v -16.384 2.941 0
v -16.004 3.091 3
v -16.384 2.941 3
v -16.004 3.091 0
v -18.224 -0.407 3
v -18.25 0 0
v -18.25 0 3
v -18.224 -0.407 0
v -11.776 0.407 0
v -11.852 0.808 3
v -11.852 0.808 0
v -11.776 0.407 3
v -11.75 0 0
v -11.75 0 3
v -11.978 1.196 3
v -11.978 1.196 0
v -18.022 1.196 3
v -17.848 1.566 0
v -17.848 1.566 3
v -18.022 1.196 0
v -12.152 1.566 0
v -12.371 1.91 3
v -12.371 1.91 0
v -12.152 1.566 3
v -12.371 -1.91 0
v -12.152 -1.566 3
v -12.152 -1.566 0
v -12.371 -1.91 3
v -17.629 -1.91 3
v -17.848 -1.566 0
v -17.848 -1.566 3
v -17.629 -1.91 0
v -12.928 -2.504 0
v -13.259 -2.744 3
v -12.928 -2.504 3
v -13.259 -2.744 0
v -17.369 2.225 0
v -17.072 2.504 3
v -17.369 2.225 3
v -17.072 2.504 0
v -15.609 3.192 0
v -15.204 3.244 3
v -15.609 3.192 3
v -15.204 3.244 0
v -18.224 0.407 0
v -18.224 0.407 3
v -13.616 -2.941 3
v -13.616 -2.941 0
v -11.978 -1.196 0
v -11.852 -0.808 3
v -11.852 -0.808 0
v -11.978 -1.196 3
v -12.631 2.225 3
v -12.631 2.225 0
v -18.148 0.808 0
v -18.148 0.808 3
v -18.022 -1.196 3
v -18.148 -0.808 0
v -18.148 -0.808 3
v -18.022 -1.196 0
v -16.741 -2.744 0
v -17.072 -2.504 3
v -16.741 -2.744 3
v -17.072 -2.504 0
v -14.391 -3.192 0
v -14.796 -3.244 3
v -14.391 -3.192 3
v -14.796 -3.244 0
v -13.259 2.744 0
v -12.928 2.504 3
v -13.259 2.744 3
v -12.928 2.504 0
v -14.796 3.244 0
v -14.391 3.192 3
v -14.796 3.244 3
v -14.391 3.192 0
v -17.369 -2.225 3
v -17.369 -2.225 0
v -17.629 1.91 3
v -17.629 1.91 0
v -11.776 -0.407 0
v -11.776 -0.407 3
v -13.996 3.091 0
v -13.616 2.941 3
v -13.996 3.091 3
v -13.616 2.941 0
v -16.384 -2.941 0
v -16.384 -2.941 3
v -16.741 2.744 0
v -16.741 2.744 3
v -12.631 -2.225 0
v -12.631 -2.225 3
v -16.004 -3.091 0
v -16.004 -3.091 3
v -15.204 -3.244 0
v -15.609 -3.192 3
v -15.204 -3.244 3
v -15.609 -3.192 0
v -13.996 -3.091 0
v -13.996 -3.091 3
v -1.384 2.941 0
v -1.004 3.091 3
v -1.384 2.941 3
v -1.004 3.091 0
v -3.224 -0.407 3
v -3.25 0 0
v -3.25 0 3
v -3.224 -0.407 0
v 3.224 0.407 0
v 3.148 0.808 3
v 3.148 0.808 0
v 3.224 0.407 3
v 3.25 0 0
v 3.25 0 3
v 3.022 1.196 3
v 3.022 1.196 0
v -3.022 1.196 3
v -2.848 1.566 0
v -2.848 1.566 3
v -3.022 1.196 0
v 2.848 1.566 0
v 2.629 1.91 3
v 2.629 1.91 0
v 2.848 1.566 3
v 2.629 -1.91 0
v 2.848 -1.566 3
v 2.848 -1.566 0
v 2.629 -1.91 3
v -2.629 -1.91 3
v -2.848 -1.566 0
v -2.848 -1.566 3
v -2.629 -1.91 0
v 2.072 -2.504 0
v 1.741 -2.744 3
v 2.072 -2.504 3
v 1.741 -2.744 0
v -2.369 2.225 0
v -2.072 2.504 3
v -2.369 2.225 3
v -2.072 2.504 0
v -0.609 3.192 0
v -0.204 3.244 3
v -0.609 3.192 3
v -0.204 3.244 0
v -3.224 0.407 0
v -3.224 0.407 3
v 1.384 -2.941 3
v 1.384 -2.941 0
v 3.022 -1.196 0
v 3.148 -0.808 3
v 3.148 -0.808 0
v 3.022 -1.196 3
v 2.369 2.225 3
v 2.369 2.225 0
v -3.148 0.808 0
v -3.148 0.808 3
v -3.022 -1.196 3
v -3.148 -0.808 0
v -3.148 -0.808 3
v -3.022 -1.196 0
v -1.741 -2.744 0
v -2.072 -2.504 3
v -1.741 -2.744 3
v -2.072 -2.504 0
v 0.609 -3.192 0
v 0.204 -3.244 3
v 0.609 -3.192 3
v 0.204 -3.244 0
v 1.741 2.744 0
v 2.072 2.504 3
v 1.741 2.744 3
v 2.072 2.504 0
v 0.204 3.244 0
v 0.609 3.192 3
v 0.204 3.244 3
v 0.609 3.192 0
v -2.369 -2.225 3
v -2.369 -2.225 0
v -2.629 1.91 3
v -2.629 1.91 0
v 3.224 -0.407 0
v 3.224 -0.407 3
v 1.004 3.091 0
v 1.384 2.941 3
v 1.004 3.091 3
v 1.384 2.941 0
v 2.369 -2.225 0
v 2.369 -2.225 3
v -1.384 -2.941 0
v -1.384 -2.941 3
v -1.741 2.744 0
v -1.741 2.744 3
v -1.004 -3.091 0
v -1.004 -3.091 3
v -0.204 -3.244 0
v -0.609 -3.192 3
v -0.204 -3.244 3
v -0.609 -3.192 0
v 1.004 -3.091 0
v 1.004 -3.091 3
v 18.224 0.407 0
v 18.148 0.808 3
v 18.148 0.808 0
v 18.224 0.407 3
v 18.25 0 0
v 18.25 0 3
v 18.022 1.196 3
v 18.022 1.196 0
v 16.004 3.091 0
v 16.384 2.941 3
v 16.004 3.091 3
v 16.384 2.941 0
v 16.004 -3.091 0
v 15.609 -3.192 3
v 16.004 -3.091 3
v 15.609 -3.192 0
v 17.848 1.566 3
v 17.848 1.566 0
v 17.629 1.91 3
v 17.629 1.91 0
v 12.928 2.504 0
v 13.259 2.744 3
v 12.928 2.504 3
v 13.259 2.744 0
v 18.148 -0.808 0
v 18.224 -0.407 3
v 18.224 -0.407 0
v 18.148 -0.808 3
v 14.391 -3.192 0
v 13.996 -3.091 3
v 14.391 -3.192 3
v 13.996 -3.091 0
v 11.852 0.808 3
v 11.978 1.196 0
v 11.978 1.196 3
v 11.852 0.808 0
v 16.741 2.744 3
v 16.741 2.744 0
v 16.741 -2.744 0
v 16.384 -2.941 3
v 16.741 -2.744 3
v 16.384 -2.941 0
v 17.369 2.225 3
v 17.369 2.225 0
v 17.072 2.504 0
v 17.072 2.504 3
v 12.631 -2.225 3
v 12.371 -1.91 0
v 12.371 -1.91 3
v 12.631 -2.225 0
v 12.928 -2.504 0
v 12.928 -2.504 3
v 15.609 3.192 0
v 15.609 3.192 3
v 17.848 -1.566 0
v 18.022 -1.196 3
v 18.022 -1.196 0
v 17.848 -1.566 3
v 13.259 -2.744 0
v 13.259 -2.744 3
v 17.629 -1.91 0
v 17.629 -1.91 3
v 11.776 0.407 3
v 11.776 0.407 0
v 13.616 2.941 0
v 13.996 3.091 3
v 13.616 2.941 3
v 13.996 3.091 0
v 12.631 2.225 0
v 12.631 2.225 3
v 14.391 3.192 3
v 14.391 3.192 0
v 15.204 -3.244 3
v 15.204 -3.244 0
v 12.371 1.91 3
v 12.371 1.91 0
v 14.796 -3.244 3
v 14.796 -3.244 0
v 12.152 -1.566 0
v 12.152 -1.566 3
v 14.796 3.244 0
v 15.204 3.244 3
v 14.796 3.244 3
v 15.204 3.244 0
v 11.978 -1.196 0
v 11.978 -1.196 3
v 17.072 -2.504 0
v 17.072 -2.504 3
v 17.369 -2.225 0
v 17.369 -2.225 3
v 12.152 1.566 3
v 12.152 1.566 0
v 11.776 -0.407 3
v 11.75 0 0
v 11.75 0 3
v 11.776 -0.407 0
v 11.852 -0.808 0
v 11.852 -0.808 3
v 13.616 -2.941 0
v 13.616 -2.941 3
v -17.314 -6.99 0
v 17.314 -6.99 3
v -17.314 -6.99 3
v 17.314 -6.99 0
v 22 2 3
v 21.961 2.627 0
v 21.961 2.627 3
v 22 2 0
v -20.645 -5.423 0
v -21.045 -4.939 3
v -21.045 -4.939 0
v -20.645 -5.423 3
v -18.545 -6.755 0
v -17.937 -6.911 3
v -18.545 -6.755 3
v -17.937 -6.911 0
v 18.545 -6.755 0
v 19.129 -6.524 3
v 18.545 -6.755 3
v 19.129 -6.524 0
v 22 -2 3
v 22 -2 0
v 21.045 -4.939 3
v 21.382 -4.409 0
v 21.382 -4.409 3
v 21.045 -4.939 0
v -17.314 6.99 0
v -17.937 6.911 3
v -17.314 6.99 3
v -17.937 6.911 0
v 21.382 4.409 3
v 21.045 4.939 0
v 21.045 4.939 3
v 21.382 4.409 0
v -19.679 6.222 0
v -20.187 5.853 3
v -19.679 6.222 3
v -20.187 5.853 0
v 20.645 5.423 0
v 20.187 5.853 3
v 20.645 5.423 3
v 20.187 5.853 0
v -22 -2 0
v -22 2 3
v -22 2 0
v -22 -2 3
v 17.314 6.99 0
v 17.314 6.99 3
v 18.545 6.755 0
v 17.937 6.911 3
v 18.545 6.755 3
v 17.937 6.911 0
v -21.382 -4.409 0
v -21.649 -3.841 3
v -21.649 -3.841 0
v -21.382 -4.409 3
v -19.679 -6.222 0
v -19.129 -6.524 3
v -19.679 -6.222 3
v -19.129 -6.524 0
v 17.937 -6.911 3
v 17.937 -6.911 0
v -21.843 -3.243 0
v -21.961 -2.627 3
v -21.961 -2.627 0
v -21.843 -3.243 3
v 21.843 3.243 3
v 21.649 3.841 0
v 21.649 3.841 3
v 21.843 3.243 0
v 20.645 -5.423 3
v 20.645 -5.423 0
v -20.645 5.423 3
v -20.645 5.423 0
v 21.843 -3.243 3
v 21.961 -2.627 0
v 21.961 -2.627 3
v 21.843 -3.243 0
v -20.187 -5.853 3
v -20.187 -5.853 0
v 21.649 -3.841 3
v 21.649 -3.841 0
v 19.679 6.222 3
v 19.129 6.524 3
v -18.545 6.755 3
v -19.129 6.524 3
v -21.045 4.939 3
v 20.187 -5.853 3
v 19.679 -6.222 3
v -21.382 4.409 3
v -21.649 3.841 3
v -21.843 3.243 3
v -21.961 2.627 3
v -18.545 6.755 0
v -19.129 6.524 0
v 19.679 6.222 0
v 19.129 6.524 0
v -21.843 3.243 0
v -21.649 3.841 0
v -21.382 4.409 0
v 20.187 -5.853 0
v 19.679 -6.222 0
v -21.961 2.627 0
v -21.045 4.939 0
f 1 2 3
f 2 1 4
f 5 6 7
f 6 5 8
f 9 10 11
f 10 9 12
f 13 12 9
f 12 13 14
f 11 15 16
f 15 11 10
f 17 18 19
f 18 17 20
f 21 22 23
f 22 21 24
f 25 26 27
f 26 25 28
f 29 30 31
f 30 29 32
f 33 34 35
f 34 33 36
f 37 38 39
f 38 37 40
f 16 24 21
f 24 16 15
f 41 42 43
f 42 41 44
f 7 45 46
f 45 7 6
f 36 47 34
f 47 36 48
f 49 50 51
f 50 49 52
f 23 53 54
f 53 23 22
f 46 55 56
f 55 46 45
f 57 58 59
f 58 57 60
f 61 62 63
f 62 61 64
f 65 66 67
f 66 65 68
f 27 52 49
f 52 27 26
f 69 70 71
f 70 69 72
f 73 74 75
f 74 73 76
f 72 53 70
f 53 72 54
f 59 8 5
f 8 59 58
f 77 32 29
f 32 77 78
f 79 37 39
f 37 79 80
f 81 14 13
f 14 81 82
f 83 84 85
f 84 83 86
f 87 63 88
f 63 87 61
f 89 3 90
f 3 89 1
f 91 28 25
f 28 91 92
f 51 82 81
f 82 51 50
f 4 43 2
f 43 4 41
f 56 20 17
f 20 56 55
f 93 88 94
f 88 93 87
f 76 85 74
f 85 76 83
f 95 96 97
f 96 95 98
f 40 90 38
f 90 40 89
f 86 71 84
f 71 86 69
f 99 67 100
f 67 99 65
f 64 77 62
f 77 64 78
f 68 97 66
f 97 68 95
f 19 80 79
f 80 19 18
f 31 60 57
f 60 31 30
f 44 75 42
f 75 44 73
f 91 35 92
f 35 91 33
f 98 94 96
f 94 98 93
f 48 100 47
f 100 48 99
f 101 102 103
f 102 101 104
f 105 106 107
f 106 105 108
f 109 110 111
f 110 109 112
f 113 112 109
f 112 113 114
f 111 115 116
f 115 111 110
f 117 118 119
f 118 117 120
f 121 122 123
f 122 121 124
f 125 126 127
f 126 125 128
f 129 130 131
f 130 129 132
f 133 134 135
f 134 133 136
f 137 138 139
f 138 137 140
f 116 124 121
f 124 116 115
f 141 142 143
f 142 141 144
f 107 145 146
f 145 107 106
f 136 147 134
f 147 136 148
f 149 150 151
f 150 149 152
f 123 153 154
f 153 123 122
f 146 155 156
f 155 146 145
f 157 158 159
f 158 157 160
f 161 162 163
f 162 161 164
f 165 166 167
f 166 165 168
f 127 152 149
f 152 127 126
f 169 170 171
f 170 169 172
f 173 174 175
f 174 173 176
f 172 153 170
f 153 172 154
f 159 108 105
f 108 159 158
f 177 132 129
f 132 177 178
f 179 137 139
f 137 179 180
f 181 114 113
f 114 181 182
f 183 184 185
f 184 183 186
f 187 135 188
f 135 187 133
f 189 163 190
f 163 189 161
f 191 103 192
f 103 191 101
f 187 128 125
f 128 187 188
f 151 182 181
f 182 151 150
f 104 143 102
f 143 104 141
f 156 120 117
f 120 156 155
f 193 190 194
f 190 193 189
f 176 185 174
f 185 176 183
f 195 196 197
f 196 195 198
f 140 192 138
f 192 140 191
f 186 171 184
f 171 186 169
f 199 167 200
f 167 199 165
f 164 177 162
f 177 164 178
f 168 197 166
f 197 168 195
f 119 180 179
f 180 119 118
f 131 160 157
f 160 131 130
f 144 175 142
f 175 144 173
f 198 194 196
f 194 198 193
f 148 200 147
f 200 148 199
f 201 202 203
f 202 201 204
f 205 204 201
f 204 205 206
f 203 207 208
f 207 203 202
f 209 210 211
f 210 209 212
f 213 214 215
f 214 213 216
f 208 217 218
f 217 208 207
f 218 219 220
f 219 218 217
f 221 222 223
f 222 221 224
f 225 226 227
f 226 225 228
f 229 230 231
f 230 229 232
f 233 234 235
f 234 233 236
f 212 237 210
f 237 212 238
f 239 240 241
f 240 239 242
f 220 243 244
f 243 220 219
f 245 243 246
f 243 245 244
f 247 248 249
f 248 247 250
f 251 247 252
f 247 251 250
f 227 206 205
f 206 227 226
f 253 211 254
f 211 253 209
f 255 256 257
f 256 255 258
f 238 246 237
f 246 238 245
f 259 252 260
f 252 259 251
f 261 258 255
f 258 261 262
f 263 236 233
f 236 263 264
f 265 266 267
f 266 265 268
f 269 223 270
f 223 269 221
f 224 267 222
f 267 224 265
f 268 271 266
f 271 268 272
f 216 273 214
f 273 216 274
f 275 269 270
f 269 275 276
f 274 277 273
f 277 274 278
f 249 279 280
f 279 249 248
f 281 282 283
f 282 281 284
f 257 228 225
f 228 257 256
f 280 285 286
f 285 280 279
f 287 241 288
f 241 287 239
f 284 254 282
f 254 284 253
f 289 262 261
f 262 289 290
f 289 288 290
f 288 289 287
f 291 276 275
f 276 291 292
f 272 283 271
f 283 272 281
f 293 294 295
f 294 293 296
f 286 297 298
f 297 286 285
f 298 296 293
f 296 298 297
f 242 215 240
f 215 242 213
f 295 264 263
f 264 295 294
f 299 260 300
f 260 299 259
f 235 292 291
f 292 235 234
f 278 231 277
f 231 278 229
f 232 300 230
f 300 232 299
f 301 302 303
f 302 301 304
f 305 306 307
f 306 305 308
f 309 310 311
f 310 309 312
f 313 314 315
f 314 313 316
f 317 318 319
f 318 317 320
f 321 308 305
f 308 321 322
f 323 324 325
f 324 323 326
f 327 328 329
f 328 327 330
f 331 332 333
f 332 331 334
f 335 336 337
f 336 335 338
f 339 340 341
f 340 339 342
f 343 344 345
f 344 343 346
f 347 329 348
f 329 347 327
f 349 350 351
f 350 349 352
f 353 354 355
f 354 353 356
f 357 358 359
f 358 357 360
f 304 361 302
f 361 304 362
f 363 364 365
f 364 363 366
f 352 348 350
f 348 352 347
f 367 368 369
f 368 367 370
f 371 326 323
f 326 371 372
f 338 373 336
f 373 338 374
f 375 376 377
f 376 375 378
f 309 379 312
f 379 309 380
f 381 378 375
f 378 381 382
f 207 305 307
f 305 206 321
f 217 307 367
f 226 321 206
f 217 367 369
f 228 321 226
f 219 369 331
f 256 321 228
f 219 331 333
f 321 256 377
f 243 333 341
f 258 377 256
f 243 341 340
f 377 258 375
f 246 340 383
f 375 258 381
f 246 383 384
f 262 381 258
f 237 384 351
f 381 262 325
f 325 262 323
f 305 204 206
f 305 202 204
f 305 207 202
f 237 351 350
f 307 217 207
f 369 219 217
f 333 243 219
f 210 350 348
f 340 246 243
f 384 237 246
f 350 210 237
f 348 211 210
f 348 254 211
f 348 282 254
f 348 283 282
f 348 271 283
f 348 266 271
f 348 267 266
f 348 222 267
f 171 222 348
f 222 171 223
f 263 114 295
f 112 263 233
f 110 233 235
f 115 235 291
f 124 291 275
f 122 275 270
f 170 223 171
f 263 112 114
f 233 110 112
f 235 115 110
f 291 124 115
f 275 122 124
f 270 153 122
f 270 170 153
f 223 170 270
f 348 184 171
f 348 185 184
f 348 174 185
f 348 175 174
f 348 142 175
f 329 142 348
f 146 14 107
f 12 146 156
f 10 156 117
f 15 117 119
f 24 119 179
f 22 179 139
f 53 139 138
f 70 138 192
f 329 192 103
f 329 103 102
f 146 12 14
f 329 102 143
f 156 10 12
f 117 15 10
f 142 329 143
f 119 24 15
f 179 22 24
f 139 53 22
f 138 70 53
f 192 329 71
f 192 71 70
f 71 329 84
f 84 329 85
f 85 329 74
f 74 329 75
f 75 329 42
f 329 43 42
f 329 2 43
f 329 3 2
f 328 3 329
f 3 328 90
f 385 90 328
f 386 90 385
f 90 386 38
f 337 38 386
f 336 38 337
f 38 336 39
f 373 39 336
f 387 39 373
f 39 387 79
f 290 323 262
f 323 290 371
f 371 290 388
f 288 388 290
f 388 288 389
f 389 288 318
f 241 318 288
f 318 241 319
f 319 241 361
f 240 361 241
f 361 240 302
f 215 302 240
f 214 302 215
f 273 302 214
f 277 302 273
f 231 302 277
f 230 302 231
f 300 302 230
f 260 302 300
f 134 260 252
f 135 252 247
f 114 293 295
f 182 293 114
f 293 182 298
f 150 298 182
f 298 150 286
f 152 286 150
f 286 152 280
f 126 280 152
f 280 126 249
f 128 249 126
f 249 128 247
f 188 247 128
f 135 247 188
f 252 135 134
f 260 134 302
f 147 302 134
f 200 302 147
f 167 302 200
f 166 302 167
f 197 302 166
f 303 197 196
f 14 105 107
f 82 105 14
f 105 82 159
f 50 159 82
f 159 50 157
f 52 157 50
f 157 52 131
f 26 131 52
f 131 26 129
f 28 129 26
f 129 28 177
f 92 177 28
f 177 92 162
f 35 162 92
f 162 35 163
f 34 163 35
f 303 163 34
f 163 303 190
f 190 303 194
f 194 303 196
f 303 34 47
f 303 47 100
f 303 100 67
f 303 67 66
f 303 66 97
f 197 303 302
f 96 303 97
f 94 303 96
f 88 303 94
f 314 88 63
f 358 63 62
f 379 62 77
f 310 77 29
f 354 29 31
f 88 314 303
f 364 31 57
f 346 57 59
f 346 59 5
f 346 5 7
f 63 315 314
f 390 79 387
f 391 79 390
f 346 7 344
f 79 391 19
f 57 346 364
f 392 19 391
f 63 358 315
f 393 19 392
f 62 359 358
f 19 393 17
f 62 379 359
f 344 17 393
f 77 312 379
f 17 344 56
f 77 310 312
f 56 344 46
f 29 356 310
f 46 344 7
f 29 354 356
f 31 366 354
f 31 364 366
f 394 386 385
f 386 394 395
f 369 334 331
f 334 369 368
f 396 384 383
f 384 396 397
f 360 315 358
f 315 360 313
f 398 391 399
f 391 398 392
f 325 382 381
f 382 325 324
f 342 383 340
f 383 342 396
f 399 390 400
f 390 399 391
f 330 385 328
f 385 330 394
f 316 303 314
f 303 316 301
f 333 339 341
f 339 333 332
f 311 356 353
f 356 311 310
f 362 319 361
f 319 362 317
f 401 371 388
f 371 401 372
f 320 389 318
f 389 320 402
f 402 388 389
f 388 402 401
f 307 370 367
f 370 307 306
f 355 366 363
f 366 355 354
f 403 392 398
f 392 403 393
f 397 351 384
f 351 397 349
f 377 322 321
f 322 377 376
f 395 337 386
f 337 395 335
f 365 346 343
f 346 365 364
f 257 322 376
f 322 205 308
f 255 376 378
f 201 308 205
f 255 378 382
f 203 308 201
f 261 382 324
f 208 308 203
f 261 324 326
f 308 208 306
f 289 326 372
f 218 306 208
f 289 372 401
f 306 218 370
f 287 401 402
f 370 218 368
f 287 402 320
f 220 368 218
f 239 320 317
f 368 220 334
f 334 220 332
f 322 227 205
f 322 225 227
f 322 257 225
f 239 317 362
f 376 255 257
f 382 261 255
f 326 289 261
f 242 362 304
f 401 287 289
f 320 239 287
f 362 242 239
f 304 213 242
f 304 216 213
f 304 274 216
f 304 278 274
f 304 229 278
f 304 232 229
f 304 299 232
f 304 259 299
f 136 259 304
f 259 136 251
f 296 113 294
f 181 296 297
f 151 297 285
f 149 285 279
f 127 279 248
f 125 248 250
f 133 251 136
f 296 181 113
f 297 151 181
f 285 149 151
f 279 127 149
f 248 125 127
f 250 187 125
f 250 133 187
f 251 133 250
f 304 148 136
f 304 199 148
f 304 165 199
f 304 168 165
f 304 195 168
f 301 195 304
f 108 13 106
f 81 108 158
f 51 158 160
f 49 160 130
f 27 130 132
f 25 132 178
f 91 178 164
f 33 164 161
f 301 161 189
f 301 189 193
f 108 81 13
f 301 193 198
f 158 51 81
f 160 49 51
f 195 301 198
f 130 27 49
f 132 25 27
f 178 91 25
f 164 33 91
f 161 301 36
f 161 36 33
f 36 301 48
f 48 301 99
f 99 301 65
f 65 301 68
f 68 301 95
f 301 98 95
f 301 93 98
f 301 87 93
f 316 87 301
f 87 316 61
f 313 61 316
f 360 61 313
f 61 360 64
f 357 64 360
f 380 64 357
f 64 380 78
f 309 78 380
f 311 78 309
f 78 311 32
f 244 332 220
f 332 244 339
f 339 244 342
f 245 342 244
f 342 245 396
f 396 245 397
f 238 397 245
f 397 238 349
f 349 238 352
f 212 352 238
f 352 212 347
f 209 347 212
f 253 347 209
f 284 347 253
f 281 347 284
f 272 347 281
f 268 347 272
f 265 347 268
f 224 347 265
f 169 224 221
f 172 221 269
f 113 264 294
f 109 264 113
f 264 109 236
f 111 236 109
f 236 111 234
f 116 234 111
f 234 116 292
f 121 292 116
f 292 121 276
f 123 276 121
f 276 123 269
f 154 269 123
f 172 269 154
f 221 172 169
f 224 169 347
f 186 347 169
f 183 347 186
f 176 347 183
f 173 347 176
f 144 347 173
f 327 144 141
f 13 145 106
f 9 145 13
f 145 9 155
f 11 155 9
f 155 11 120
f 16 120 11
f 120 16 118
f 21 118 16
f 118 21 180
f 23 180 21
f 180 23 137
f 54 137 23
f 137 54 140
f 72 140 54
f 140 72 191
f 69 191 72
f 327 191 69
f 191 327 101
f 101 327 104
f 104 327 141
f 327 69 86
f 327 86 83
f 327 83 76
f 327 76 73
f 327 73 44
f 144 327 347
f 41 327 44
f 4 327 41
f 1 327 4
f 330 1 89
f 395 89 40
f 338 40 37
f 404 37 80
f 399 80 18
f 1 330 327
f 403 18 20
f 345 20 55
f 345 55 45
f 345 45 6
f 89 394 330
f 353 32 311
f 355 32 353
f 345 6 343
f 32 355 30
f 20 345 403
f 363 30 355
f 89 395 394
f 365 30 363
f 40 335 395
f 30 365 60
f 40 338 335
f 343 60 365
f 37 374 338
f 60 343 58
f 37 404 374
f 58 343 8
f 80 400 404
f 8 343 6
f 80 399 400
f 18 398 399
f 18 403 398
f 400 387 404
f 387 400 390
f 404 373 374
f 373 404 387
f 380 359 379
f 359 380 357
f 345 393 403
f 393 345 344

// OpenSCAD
// Generated by SolidPython 1.1.3 on 2023-03-12 21:51:37
$fn = 50;


difference() {
	union() {
		translate(v = [0, 0, 0]) {
			rotate(a = [0, 0, 0]) {
				hull() {
					translate(v = [-17.0000000000, 2.0000000000, 0]) {
						rotate(a = [0, 0, 0]) {
							translate(v = [0, 0, 0]) {
								rotate(a = [0, 0, 0]) {
									cylinder(h = 3, r = 5);
								}
							}
						}
					}
					translate(v = [17.0000000000, 2.0000000000, 0]) {
						rotate(a = [0, 0, 0]) {
							translate(v = [0, 0, 0]) {
								rotate(a = [0, 0, 0]) {
									cylinder(h = 3, r = 5);
								}
							}
						}
					}
					translate(v = [-17.0000000000, -2.0000000000, 0]) {
						rotate(a = [0, 0, 0]) {
							translate(v = [0, 0, 0]) {
								rotate(a = [0, 0, 0]) {
									cylinder(h = 3, r = 5);
								}
							}
						}
					}
					translate(v = [17.0000000000, -2.0000000000, 0]) {
						rotate(a = [0, 0, 0]) {
							translate(v = [0, 0, 0]) {
								rotate(a = [0, 0, 0]) {
									cylinder(h = 3, r = 5);
								}
							}
						}
					}
				}
			}
		}
	}
	union() {
		translate(v = [-15.0000000000, 0.0000000000, 0]) {
			rotate(a = [0, 0, 0]) {
				translate(v = [0, 0, -50]) {
					rotate(a = [0, 0, 0]) {
						cylinder(h = 100, r = 3.2500000000);
					}
				}
			}
		}
		translate(v = [0.0000000000, 0.0000000000, 0]) {
			rotate(a = [0, 0, 0]) {
				translate(v = [0, 0, -50]) {
					rotate(a = [0, 0, 0]) {
						cylinder(h = 100, r = 3.2500000000);
					}
				}
			}
		}
		translate(v = [15.0000000000, 0.0000000000, 0]) {
			rotate(a = [0, 0, 0]) {
				translate(v = [0, 0, -50]) {
					rotate(a = [0, 0, 0]) {
						cylinder(h = 100, r = 3.2500000000);
					}
				}
			}
		}
	}
}
/***********************************************
*********      SolidPython code:      **********
************************************************
 
from solid import *
import os
import subprocess

import oomB

import opsc_library_gen

mode = "laser"
#mode = "3d_print"

defined_objects = {}

radius_dict = {}
countersunk_dict = {}


def set_mode(m):
    global mode
    mode = m
    radius_dict['M6'] = 6.5/2
    radius_dict['M3'] = 3.3/2
    if mode == "laser":
        radius_dict['M6'] = 6/2
        radius_dict['M3'] = 3/2

    countersunk_dict['M3'] = {}
    countersunk_dict['M3']['little_rad'] = radius_dict['M3']
    countersunk_dict['M3']['big_rad'] = (5.5+0.6)/2
    if mode == "laser":
        countersunk_dict['M3']['big_rad'] = (4.75+0.6)/2
        countersunk_dict['M3']['little_rad'] = (4.75+0.6)/2

    countersunk_dict['M3']['height'] = 1.7


def opsc_make_object(filename, objects, save_type="none",resolution=50, layers = 1, tilediff = 200, mode="laser", overwrite=True):
    if overwrite or not os.path.exists(filename):
        set_mode(mode)
        save_type = save_type.lower()
        os.makedirs(os.path.dirname(filename), exist_ok=True)
        final_object = opsc_get_object(objects, mode = mode)
        # Save the final object to the specified filename    
        scad_render_to_file(final_object, filename, file_header='$fn = %s;' % resolution, include_orig_code=True)
        if mode == "laser":
            filename_laser = filename.replace(".scad","-flat.scad")
            scad_render_to_file(getLaser(final_object, layers=layers, tilediff=tilediff), filename_laser, file_header='$fn = %s;' % resolution, include_orig_code=True)
            if save_type == "all":
                saveToAll(filename_laser)
            elif save_type == "dxf":
                saveToDxf(filename_laser)
        if save_type == "all":
            saveToAll(filename)
        elif save_type == "dxf":
            saveToDxf(filename)


def opsc_get_object(objects, mode = "laser"):
    # Create the solidpython objects only include the positive objects and if they don't have inclusion or their inclusion is either all or mode
    # Initialize an empty list to store the results
    positive_objects = []

    # Iterate over the "objects" list
    for obj in objects:
        # Check if the current object has a "type" key with a value of "positive"
        if obj['type'] == 'positive':
            # Check if the current object has an "inclusion" key and its value matches "mode",
            # or if the current object does not have an "inclusion" key at all
            if not 'inclusion' in obj or obj['inclusion'] == "all" or obj['inclusion'] == mode:
                # Call the "get_opsc_item" function with the current object as an argument
                opsc_item = get_opsc_item(obj)
                # Add the result to the "positive_objects" list
                positive_objects.append(opsc_item)
# Initialize an empty list to store the results
    negative_objects = []

    # Iterate over the "objects" list
    for obj in objects:
        # Check if the current object has a "type" key with a value of "negative"
        if obj['type'] == 'negative':
            # Check if the current object has an "inclusion" key and its value matches "mode",
            # or if the current object does not have an "inclusion" key at all
            if not 'inclusion' in obj or obj['inclusion'] == "all" or obj['inclusion'] == mode:
                # Call the "get_opsc_item" function with the current object as an argument
                opsc_item = get_opsc_item(obj)
                # Add the result to the "negative_objects" list
                negative_objects.append(opsc_item)
    
    #positive_objects = [get_opsc_item(obj) for obj in objects if obj['type'] == 'positive']
    #negative_objects = [get_opsc_item(obj) for obj in objects if obj['type'] == 'negative']
    # Union the positive objects
    positive_object = union()(*positive_objects)
    # Union the negative objects
    negative_object = union()(*negative_objects)
    # Create the final object by subtracting the negative objects from the positive objects
    return difference()(positive_object, negative_object)

def get_opsc_item(params):
    # A dictionary to map radius string values to numerical values
    #radius_dict = {'small': 5, 'medium': 10, 'large': 15}
    # An array of function names for basic shapes
    basic_shapes = ['cube', 'sphere', 'cylinder']
    
    # An array of function names for other shapes
    other_shapes = ['hole', 'slot', 'rounded_rectangle', 'countersunk']
    


    # Convert radius to r if present, and remove radius from the params dictionary
    if 'radius' in params:
        if isinstance(params['radius'], str):
            # Use the radius_dict to map the radius string value to a numerical value
            params['r'] = radius_dict[params['radius']]
        else:
            params['r'] = params['radius']
        del params['radius']
    

    # Check if the object type is a basic shape
    if params['shape'] in basic_shapes:
        # Remove shape and unexpected dictionary values
        allowed_keys = {'size', 'r', 'r1', 'r2', 'd', 'h', 'rw', 'rh', 'dw', 'dh'}
        shape_params = {k: v for k, v in params.items() if k in allowed_keys}

        # Call the corresponding function for the shape parameter, using ** notation to pass the shape_params dictionary as keyword arguments
        return get_opsc_transform(params,globals()[params['shape']](**shape_params))
    
    # If the object type is not a basic shape, check if it's a defined object or one of the other shapes
    elif params['shape'] in other_shapes:
        # Call the corresponding function for the shape parameter, passing the params dictionary as an argument
        p2 = copy.deepcopy(params)
        p2["pos"] = [0,0,0]
        return get_opsc_transform(params,globals()[params['shape']](p2))
    
    # If the object is not a basic shape or a defined object, try to import it from a .scad file
    else:
        obj = defined_objects[params['shape']]
        return get_opsc_transform(params,obj)

def get_opsc_transform(params, solid_obj):
    # Rotate the object based on the 'rot' field in the params dictionary, or the 'rotX', 'rotY', and 'rotZ' fields if 'rot' is not present
    rot = params.get('rot', [])
    if rot:
        rotX, rotY, rotZ = rot
    else:
        rotX = params.get('rotX', 0)
        rotY = params.get('rotY', 0)
        rotZ = params.get('rotZ', 0)
    solid_obj = rotate([rotX, rotY, rotZ])(solid_obj)

    # Translate the object based on the 'pos' field in the params dictionary, or the 'x', 'y', and 'z' fields if 'pos' is not present
    pos = params.get('pos', [])
    if pos:
        x, y, z = pos
    else:
        x = params.get('x', 0)
        y = params.get('y', 0)
        z = params.get('z', 0)
    solid_obj = translate([x, y, z])(solid_obj)
    return solid_obj


import random

def opsc_easy_array(type, shape, repeats, pos_start, shift_arr, **kwargs):
    for i in range(0,3):
        repeats.append(1)
        pos_start.append(0)
        shift_arr.append(0)
    return_objects = []

    for x in range(0,repeats[0]):
        for y in range(0,repeats[1]):
            for z in range(0,repeats[2]):
                return_objects.append(opsc_easy(type, shape, pos=[pos_start[0]+x*shift_arr[0],pos_start[1]+y*shift_arr[1],pos_start[2]+z*shift_arr[2]], **kwargs))
    return return_objects                



def opsc_easy(type, shape, **kwargs):
    obj = {
        'type': type,
        'shape': shape
    }
    for param in ['size', 'r', 'r1', 'r2', 'd', 'h', 'rw', 'rh', 'dw', 'dh', 'pos', 'x', 'y', 'z', 'rot', 'rotX', 'rotY', 'rotZ', "w", "inclusion"]:
        if param in kwargs:
            obj[param] = kwargs[param]
    return obj

def hole(params):
    p2 = copy.deepcopy(params)  
    # Check if the radius is a string and replace it with the corresponding value from the dictionary
    if isinstance(p2['r'], str):
        p2['r'] = radius_dict[p2['r']]
    
    # Set the height to 100 if not specified
    if 'h' not in p2:
        p2['h'] = 100
        p2["pos"] = [0,0,-50]
    p2["center"] = True
    # Create the cylinder object
    p2["shape"] = "cylinder"
    p2["type"] = "positive"

    return get_opsc_item(p2)

import copy

def countersunk(params):
    p2 = copy.deepcopy(params)
    counter_rad = p2['r']
    p2['r'] = radius_dict[p2['r']]
    hp = copy.deepcopy(p2)
    hp["type"] = "positive"
    hp["shape"] = "hole"
    del hp["rot"]
    hol = get_opsc_item(hp)
    
    cp = copy.deepcopy(p2)
    cp["h"] = countersunk_dict[counter_rad]["height"]
    cp["r2"] = countersunk_dict[counter_rad]["little_rad"]
    cp["r1"] = countersunk_dict[counter_rad]["big_rad"]
    del cp["r"]
    del cp["rot"]
    cp["type"] = "positive"
    cp["shape"] = "cylinder"
    cp["pos"] = [0,0,0]

    top = get_opsc_item(cp)
    return union()(hol,top)



def slot(params):  
    p2 = copy.deepcopy(params) 
    if isinstance(p2['r'], str):
        p2['r'] = radius_dict[p2['r']]
    p2["type"] = "positive"
    p2["shape"] = "hole"
    del p2["rot"]
    p2["pos"] = [0,0,0]
    left = copy.deepcopy(p2)
    right = copy.deepcopy(p2)
    left["pos"][0] = p2["w"] / 2 - p2["r"] 
    
    right["pos"][0] = -p2["w"] / 2 + p2["r"] 
    pass
    leftObj = get_opsc_item(left)
    rightObj = get_opsc_item(right)
    return hull()(leftObj, rightObj)

def rounded_rectangle(params):   
    p2 = copy.deepcopy(params) 
    p2["h"] = p2["size"][2]
    p2["pos"] = p2.get("pos", [0, 0, 0]) 
    p2["type"] = "positive"
    p2["shape"] = "hole"
    p2["pos"] = [0,0,0]
    
    if 'rot' in p2:
        del p2["rot"]   
    if 'r' not in p2:
        p2["r"] = 5 
    tl = copy.deepcopy(p2)
    tr = copy.deepcopy(p2)
    bl = copy.deepcopy(p2)
    br = copy.deepcopy(p2)
    tl["pos"][0] = -(p2["size"][0] - p2["r"]*2)/2
    tl["pos"][1] = (p2["size"][1] - p2["r"]*2)/2
    tr["pos"][0] = (p2["size"][0] - p2["r"]*2)/2
    tr["pos"][1] = (p2["size"][1] - p2["r"]*2)/2
    bl["pos"][0] = -(p2["size"][0] - p2["r"]*2)/2
    bl["pos"][1] = -(p2["size"][1] - p2["r"]*2)/2
    br["pos"][0] = (p2["size"][0] - p2["r"]*2)/2
    br["pos"][1] = -(p2["size"][1] - p2["r"]*2)/2
    del tl["size"]
    del tr["size"]
    del bl["size"]
    del br["size"]
    tlo = get_opsc_item(tl)
    tro = get_opsc_item(tr)
    blo = get_opsc_item(bl)
    bro = get_opsc_item(br)    
    return hull()(tlo, tro, blo, bro)



def import_scad_object(filename):
    # Import the .scad file and convert it to a solidpython object
    #filename = "parts"
    obj = import_scad(filename)
    return obj.main()
    


import os
import solid as solidpython

# A dictionary to store the defined objects


def load_scad_objects():
    opsc_library_gen.gen_library(defined_objects)

import random

def test(num_objects):
    objects = []
    for i in range(num_objects):
        # Choose a random shape
        #shape = random.choice(['cube', 'sphere', 'cylinder', 'hole', 'slot', "rounded_rectangle"])
        shape = random.choice(["rounded_rectangle"])

        # Choose a random type
        type = random.choice(['positive', 'negative'])
        
        # Create an empty object dictionary
        obj = {'shape': shape, 'type': type}
        
        # Set shape-specific parameters
        if obj['shape'] in ['cube']:
            obj['size'] =  [random.uniform(5, 15), random.uniform(5, 15), random.uniform(5, 15)]
        if obj['shape'] in ['rounded_rectangle']:
            obj['size'] =  [random.uniform(5, 15), random.uniform(5, 15), random.uniform(5, 15)]
            obj['r'] = random.uniform(0.5, 5)
        elif obj['shape'] == 'sphere':
            obj['r'] = random.uniform(5, 15)
        elif obj['shape'] in ['cylinder', 'hole']:
            obj['r'] = random.uniform(0.5, 5)
            obj['h'] = random.uniform(5, 15)
        elif obj['shape'] == 'slot':
            obj['r'] = random.uniform(0.5, 5)
            obj['h'] = random.uniform(5, 15)
            obj['w'] = random.uniform(5, 15)
        
        # Set a random position and rotation
        obj['pos'] = [random.uniform(-20, 20), random.uniform(-20, 20), random.uniform(-20, 20)]
        obj['rot'] = [random.uniform(-180, 180), random.uniform(-180, 180), random.uniform(-180, 180)]
        
        # Add the object to the list
        objects.append(obj)
    return objects

####### old file saving
def saveToAll(fileIn):
    saveToDxf(fileIn)
    saveToPng(fileIn)
    saveToStl(fileIn)
    saveToSvg(fileIn)

def saveToDxf(fileIn, fileOut="", copy_to_laser=True):
    if fileOut == "":
        fileOut = fileIn.replace(".scad",".dxf")
    saveToFile(fileIn, fileOut)


    
def saveToPng(fileIn, fileOut="",extra="--render"):
    if fileOut == "":
        fileOut = fileIn.replace(".scad",".png")
    saveToFile(fileIn, fileOut)

def saveToStl(fileIn, fileOut=""):
    if fileOut == "":
        fileOut = fileIn.replace(".scad",".stl")
    saveToFile(fileIn, fileOut)
    
def saveToSvg(fileIn, fileOut=""):
    if fileOut == "":
        fileOut = fileIn.replace(".scad",".svg")
    saveToFile(fileIn, fileOut)

def saveToFile(fileIn, fileOut,extra=""):
    #extra = extra + " --colorscheme Tomorrow"

    launchStr = 'openscad -o "' + fileOut + '"' + extra + ' "' + fileIn + '"'
    if ".png" in fileOut:
        launchStr = launchStr + " --render"
    print("            saveToFile launch string: " + launchStr)
    subprocess.run(launchStr)
    x=0

def getLaser(final_object,start=1.5,layers=1,thickness=3,tilediff=200):
        rv= []

        for x in range(layers):
            rv.append(translate([0,x*tilediff,0])(
                    projection()(
                        intersection()(translate([-500,-500,start+x*thickness])(cube(size=[1000,1000,0.1])),
                            final_object
                        )
                    )
            )
            )
            
        return union()(rv)

set_mode("laser")
load_scad_objects() 
 
************************************************/
